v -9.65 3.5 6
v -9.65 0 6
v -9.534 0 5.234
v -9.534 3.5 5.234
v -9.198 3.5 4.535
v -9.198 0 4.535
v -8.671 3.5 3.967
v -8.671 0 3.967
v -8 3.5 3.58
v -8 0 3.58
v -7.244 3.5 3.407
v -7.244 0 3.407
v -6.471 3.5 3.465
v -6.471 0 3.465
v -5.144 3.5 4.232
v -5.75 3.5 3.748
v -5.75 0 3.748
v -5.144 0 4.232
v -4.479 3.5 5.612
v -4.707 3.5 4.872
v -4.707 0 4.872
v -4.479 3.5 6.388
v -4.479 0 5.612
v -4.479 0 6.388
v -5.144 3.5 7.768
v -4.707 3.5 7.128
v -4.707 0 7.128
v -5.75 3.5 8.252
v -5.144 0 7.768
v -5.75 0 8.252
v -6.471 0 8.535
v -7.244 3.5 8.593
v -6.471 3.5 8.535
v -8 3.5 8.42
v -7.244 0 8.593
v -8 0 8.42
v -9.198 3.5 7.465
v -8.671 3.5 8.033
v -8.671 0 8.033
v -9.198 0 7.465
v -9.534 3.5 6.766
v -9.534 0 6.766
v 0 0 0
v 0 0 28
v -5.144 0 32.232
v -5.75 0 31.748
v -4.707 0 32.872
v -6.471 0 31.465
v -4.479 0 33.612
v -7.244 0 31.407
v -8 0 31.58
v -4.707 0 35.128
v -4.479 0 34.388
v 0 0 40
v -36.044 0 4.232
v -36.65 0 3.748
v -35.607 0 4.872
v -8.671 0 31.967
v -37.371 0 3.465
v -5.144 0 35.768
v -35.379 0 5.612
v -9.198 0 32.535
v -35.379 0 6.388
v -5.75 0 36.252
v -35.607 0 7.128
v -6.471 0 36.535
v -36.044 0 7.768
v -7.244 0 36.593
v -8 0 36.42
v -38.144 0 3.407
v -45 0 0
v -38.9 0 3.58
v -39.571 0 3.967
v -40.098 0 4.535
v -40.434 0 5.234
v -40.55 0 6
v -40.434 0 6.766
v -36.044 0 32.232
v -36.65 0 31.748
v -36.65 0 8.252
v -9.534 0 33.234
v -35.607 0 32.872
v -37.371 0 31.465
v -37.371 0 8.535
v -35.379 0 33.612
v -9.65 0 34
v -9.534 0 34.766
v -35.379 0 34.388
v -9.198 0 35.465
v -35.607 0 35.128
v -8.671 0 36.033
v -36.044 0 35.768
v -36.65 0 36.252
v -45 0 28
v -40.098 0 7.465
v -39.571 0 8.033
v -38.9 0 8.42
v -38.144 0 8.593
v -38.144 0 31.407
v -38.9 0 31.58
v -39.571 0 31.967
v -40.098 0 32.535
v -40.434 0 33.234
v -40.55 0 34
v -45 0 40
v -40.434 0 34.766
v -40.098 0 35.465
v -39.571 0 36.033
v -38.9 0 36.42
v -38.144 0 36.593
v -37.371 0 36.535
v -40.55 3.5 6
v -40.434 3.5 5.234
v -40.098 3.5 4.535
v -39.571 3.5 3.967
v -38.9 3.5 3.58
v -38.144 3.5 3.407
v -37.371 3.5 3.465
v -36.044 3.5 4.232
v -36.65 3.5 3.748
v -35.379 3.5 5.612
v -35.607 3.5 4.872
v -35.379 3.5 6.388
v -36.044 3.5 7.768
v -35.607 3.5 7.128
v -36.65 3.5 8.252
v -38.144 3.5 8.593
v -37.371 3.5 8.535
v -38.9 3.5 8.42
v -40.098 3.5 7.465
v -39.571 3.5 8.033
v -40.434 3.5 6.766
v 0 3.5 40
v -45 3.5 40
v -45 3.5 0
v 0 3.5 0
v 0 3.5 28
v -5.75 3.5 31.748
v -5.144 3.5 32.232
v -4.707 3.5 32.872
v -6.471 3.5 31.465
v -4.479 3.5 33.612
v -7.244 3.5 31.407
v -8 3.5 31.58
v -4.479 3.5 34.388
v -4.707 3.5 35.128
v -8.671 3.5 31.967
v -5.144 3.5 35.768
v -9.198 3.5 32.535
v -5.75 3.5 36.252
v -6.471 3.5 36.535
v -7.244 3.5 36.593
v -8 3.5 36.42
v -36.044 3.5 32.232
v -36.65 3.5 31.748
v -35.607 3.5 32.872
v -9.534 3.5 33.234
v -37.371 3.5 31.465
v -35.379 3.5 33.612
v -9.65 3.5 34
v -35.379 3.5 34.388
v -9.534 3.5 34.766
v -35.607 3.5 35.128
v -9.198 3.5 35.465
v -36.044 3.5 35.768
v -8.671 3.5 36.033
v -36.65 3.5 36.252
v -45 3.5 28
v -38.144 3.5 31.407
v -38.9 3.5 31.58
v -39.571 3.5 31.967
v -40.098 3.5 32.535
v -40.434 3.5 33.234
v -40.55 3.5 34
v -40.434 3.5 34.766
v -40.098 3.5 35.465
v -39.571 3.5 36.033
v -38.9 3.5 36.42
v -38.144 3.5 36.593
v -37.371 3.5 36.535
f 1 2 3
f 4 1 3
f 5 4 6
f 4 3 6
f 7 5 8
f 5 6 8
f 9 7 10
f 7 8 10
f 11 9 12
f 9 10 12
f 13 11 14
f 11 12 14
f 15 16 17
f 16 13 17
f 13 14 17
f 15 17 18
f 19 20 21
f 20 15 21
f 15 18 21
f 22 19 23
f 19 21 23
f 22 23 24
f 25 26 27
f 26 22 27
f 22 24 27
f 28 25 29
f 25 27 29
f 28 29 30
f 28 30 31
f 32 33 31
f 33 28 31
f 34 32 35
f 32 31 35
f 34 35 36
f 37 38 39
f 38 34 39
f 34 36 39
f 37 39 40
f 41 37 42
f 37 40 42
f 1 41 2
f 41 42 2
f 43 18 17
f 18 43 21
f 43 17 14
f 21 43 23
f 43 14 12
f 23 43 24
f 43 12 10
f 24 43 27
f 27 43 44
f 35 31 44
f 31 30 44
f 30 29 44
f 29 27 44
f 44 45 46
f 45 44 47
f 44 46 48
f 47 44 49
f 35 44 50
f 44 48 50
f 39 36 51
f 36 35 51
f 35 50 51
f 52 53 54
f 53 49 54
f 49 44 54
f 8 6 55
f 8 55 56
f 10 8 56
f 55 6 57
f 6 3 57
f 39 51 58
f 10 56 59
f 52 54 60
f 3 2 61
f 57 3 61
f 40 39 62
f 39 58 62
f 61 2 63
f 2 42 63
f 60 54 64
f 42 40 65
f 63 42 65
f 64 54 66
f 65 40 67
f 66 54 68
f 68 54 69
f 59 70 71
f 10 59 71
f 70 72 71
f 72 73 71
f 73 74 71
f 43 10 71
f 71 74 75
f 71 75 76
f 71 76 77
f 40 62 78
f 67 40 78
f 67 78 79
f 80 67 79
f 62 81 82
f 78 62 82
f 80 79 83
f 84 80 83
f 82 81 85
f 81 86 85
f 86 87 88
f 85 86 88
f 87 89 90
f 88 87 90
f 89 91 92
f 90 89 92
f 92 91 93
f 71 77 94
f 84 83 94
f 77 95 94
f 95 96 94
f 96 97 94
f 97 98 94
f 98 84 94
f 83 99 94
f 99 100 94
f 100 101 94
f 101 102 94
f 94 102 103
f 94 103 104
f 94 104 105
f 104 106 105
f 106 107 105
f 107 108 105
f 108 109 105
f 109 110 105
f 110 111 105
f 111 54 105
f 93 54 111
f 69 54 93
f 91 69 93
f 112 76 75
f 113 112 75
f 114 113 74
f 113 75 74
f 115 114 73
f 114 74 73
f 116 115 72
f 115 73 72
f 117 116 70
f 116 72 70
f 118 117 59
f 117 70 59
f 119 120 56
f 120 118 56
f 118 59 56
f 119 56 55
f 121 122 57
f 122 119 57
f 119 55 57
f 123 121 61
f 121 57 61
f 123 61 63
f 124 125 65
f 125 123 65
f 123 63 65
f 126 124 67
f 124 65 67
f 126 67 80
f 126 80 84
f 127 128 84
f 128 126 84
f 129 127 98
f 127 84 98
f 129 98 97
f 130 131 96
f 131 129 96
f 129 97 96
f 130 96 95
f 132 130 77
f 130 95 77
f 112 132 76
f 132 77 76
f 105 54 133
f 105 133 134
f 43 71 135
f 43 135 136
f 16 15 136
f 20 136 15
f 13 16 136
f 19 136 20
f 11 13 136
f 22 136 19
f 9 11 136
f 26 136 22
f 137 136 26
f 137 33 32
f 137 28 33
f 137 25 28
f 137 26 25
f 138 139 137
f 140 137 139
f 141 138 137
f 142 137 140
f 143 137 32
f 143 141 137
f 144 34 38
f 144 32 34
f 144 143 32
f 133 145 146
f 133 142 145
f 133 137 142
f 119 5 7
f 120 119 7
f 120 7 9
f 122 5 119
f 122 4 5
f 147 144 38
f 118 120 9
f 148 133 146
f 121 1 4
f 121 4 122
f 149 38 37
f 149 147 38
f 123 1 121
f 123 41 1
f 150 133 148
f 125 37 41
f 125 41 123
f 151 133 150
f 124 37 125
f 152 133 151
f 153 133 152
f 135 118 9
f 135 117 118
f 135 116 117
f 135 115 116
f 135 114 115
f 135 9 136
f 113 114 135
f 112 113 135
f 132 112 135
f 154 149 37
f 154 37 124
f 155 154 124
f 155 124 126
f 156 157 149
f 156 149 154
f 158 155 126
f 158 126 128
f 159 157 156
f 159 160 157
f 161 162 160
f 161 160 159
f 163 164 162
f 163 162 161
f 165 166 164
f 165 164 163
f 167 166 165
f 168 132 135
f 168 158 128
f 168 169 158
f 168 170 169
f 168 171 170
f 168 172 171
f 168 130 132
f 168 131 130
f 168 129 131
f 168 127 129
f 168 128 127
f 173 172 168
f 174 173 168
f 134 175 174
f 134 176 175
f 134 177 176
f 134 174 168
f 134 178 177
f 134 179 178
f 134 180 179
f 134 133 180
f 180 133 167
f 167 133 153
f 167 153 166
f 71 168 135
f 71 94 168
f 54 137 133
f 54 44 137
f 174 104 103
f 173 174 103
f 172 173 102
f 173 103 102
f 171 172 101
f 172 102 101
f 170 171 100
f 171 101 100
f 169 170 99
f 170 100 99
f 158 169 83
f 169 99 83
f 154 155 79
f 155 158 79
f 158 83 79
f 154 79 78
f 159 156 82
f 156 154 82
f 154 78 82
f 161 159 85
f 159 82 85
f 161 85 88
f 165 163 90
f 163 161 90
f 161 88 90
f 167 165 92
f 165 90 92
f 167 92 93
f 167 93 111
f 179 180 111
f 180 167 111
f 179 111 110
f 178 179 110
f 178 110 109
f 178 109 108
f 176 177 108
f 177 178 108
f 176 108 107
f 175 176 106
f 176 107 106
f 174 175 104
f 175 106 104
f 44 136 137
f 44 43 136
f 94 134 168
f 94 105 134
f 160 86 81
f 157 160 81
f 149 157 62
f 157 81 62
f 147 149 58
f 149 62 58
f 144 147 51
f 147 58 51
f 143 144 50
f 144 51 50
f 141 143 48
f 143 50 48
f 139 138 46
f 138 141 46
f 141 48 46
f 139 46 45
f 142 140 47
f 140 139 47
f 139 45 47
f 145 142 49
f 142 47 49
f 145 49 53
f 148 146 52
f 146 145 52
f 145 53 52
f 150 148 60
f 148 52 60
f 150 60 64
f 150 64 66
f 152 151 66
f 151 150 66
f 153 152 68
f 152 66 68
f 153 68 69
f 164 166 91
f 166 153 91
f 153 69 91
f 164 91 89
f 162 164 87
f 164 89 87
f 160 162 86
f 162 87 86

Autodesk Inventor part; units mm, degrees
ref_plane "YZ Plane" through (0, 0, 0) normal (1, 0, 0) x (0, 1, 0)
ref_plane "XZ Plane" through (0, 0, 0) normal (0, 1, 0) x (-1, 0, 0)
ref_plane "XY Plane" through (0, 0, 0) normal (0, 0, 1) x (1, 0, 0)
sketch "Sketch1" plane through (0, 0, 0) normal (0, 1, 0) x (-1, 0, 0)
  line L0 (17.2372, 12) -> (17.2372, 28) construction
  line L1 (14.9628, 12) -> (17.2372, 12) construction
  line L2 (14.9628, 12) -> (14.9628, 28) construction
  line L3 (17.2372, 28) -> (14.9628, 28) construction
  line L4 (14.2372, 12) -> (14.2372, 28) construction
  line L5 (11.9628, 12) -> (14.2372, 12) construction
  line L6 (11.9628, 12) -> (11.9628, 28) construction
  line L7 (14.2372, 28) -> (11.9628, 28) construction
  line L8 (20.2372, 28) -> (17.9628, 28) construction
  line L9 (20.2372, 12) -> (20.2372, 28) construction
  line L10 (17.9628, 12) -> (20.2372, 12) construction
  line L11 (17.9628, 12) -> (17.9628, 28) construction
  line L12 (11.2372, 12) -> (11.2372, 28) construction
  line L13 (8.9628, 12) -> (11.2372, 12) construction
  line L14 (8.9628, 12) -> (8.9628, 28) construction
  line L15 (11.2372, 28) -> (8.9628, 28) construction
  line L16 (23.2372, 28) -> (20.9628, 28) construction
  line L17 (23.2372, 12) -> (23.2372, 28) construction
  line L18 (20.9628, 12) -> (23.2372, 12) construction
  line L19 (20.9628, 12) -> (20.9628, 28) construction
  line L20 (8.2372, 12) -> (8.2372, 28) construction
  line L21 (5.9628, 12) -> (8.2372, 12) construction
  line L22 (5.9628, 12) -> (5.9628, 28) construction
  line L23 (8.2372, 28) -> (5.9628, 28) construction
  line L24 (26.2372, 28) -> (23.9628, 28) construction
  line L25 (26.2372, 12) -> (26.2372, 28) construction
  line L26 (23.9628, 12) -> (26.2372, 12) construction
  line L27 (23.9628, 12) -> (23.9628, 28) construction
  line L28 (5.2372, 12) -> (5.2372, 28) construction
  line L29 (2.9628, 12) -> (5.2372, 12) construction
  line L30 (2.9628, 12) -> (2.9628, 28) construction
  line L31 (5.2372, 28) -> (2.9628, 28) construction
  line L32 (29.2372, 28) -> (26.9628, 28) construction
  line L33 (29.2372, 12) -> (29.2372, 28) construction
  line L34 (26.9628, 12) -> (29.2372, 12) construction
  line L35 (26.9628, 12) -> (26.9628, 28) construction
  line L36 (2.2372, 12) -> (2.2372, 28) construction
  line L37 (0, 12) -> (2.2372, 12) construction
  line L38 (0, 0) -> (0, 28)
  line L39 (45, 0) -> (0, 0)
  line L40 (45, 28) -> (45, 0)
  line L41 (43.8628, 12) -> (45, 12) construction
  line L42 (43.8628, 12) -> (43.8628, 28) construction
  line L43 (45, 28) -> (43.8628, 28) construction
  line L44 (45, 40) -> (45, 28)
  line L45 (0, 40) -> (45, 40)
  line L46 (0, 28) -> (0, 40)
  line L47 (2.2372, 28) -> (0, 28) construction
  circle A0 centre (7.05, 34) radius 2.6
  circle A1 centre (37.95, 34) radius 2.6
  circle A2 centre (37.95, 6) radius 2.6
  circle A3 centre (7.05, 6) radius 2.6
  line L48 (32.2372, 28) -> (29.9628, 28) construction
  line L49 (32.2372, 12) -> (32.2372, 28) construction
  line L50 (29.9628, 12) -> (32.2372, 12) construction
  line L51 (29.9628, 12) -> (29.9628, 28) construction
  line L52 (37.95, 6) -> (7.05, 6) construction
  line L53 (7.05, 6) -> (7.05, 34) construction
  line L54 (7.05, 34) -> (37.95, 34) construction
  line L55 (37.95, 34) -> (37.95, 6) construction
  point P0 (34.1, 12)
  dimension "d2" = 45
  dimension "d3" = 40
  dimension "d4" = 30.9
extrude "Extrusion1" add sketch "Sketch1" along normal blind 3.5
properties part number "X Axis Belt Adjustable Top"
